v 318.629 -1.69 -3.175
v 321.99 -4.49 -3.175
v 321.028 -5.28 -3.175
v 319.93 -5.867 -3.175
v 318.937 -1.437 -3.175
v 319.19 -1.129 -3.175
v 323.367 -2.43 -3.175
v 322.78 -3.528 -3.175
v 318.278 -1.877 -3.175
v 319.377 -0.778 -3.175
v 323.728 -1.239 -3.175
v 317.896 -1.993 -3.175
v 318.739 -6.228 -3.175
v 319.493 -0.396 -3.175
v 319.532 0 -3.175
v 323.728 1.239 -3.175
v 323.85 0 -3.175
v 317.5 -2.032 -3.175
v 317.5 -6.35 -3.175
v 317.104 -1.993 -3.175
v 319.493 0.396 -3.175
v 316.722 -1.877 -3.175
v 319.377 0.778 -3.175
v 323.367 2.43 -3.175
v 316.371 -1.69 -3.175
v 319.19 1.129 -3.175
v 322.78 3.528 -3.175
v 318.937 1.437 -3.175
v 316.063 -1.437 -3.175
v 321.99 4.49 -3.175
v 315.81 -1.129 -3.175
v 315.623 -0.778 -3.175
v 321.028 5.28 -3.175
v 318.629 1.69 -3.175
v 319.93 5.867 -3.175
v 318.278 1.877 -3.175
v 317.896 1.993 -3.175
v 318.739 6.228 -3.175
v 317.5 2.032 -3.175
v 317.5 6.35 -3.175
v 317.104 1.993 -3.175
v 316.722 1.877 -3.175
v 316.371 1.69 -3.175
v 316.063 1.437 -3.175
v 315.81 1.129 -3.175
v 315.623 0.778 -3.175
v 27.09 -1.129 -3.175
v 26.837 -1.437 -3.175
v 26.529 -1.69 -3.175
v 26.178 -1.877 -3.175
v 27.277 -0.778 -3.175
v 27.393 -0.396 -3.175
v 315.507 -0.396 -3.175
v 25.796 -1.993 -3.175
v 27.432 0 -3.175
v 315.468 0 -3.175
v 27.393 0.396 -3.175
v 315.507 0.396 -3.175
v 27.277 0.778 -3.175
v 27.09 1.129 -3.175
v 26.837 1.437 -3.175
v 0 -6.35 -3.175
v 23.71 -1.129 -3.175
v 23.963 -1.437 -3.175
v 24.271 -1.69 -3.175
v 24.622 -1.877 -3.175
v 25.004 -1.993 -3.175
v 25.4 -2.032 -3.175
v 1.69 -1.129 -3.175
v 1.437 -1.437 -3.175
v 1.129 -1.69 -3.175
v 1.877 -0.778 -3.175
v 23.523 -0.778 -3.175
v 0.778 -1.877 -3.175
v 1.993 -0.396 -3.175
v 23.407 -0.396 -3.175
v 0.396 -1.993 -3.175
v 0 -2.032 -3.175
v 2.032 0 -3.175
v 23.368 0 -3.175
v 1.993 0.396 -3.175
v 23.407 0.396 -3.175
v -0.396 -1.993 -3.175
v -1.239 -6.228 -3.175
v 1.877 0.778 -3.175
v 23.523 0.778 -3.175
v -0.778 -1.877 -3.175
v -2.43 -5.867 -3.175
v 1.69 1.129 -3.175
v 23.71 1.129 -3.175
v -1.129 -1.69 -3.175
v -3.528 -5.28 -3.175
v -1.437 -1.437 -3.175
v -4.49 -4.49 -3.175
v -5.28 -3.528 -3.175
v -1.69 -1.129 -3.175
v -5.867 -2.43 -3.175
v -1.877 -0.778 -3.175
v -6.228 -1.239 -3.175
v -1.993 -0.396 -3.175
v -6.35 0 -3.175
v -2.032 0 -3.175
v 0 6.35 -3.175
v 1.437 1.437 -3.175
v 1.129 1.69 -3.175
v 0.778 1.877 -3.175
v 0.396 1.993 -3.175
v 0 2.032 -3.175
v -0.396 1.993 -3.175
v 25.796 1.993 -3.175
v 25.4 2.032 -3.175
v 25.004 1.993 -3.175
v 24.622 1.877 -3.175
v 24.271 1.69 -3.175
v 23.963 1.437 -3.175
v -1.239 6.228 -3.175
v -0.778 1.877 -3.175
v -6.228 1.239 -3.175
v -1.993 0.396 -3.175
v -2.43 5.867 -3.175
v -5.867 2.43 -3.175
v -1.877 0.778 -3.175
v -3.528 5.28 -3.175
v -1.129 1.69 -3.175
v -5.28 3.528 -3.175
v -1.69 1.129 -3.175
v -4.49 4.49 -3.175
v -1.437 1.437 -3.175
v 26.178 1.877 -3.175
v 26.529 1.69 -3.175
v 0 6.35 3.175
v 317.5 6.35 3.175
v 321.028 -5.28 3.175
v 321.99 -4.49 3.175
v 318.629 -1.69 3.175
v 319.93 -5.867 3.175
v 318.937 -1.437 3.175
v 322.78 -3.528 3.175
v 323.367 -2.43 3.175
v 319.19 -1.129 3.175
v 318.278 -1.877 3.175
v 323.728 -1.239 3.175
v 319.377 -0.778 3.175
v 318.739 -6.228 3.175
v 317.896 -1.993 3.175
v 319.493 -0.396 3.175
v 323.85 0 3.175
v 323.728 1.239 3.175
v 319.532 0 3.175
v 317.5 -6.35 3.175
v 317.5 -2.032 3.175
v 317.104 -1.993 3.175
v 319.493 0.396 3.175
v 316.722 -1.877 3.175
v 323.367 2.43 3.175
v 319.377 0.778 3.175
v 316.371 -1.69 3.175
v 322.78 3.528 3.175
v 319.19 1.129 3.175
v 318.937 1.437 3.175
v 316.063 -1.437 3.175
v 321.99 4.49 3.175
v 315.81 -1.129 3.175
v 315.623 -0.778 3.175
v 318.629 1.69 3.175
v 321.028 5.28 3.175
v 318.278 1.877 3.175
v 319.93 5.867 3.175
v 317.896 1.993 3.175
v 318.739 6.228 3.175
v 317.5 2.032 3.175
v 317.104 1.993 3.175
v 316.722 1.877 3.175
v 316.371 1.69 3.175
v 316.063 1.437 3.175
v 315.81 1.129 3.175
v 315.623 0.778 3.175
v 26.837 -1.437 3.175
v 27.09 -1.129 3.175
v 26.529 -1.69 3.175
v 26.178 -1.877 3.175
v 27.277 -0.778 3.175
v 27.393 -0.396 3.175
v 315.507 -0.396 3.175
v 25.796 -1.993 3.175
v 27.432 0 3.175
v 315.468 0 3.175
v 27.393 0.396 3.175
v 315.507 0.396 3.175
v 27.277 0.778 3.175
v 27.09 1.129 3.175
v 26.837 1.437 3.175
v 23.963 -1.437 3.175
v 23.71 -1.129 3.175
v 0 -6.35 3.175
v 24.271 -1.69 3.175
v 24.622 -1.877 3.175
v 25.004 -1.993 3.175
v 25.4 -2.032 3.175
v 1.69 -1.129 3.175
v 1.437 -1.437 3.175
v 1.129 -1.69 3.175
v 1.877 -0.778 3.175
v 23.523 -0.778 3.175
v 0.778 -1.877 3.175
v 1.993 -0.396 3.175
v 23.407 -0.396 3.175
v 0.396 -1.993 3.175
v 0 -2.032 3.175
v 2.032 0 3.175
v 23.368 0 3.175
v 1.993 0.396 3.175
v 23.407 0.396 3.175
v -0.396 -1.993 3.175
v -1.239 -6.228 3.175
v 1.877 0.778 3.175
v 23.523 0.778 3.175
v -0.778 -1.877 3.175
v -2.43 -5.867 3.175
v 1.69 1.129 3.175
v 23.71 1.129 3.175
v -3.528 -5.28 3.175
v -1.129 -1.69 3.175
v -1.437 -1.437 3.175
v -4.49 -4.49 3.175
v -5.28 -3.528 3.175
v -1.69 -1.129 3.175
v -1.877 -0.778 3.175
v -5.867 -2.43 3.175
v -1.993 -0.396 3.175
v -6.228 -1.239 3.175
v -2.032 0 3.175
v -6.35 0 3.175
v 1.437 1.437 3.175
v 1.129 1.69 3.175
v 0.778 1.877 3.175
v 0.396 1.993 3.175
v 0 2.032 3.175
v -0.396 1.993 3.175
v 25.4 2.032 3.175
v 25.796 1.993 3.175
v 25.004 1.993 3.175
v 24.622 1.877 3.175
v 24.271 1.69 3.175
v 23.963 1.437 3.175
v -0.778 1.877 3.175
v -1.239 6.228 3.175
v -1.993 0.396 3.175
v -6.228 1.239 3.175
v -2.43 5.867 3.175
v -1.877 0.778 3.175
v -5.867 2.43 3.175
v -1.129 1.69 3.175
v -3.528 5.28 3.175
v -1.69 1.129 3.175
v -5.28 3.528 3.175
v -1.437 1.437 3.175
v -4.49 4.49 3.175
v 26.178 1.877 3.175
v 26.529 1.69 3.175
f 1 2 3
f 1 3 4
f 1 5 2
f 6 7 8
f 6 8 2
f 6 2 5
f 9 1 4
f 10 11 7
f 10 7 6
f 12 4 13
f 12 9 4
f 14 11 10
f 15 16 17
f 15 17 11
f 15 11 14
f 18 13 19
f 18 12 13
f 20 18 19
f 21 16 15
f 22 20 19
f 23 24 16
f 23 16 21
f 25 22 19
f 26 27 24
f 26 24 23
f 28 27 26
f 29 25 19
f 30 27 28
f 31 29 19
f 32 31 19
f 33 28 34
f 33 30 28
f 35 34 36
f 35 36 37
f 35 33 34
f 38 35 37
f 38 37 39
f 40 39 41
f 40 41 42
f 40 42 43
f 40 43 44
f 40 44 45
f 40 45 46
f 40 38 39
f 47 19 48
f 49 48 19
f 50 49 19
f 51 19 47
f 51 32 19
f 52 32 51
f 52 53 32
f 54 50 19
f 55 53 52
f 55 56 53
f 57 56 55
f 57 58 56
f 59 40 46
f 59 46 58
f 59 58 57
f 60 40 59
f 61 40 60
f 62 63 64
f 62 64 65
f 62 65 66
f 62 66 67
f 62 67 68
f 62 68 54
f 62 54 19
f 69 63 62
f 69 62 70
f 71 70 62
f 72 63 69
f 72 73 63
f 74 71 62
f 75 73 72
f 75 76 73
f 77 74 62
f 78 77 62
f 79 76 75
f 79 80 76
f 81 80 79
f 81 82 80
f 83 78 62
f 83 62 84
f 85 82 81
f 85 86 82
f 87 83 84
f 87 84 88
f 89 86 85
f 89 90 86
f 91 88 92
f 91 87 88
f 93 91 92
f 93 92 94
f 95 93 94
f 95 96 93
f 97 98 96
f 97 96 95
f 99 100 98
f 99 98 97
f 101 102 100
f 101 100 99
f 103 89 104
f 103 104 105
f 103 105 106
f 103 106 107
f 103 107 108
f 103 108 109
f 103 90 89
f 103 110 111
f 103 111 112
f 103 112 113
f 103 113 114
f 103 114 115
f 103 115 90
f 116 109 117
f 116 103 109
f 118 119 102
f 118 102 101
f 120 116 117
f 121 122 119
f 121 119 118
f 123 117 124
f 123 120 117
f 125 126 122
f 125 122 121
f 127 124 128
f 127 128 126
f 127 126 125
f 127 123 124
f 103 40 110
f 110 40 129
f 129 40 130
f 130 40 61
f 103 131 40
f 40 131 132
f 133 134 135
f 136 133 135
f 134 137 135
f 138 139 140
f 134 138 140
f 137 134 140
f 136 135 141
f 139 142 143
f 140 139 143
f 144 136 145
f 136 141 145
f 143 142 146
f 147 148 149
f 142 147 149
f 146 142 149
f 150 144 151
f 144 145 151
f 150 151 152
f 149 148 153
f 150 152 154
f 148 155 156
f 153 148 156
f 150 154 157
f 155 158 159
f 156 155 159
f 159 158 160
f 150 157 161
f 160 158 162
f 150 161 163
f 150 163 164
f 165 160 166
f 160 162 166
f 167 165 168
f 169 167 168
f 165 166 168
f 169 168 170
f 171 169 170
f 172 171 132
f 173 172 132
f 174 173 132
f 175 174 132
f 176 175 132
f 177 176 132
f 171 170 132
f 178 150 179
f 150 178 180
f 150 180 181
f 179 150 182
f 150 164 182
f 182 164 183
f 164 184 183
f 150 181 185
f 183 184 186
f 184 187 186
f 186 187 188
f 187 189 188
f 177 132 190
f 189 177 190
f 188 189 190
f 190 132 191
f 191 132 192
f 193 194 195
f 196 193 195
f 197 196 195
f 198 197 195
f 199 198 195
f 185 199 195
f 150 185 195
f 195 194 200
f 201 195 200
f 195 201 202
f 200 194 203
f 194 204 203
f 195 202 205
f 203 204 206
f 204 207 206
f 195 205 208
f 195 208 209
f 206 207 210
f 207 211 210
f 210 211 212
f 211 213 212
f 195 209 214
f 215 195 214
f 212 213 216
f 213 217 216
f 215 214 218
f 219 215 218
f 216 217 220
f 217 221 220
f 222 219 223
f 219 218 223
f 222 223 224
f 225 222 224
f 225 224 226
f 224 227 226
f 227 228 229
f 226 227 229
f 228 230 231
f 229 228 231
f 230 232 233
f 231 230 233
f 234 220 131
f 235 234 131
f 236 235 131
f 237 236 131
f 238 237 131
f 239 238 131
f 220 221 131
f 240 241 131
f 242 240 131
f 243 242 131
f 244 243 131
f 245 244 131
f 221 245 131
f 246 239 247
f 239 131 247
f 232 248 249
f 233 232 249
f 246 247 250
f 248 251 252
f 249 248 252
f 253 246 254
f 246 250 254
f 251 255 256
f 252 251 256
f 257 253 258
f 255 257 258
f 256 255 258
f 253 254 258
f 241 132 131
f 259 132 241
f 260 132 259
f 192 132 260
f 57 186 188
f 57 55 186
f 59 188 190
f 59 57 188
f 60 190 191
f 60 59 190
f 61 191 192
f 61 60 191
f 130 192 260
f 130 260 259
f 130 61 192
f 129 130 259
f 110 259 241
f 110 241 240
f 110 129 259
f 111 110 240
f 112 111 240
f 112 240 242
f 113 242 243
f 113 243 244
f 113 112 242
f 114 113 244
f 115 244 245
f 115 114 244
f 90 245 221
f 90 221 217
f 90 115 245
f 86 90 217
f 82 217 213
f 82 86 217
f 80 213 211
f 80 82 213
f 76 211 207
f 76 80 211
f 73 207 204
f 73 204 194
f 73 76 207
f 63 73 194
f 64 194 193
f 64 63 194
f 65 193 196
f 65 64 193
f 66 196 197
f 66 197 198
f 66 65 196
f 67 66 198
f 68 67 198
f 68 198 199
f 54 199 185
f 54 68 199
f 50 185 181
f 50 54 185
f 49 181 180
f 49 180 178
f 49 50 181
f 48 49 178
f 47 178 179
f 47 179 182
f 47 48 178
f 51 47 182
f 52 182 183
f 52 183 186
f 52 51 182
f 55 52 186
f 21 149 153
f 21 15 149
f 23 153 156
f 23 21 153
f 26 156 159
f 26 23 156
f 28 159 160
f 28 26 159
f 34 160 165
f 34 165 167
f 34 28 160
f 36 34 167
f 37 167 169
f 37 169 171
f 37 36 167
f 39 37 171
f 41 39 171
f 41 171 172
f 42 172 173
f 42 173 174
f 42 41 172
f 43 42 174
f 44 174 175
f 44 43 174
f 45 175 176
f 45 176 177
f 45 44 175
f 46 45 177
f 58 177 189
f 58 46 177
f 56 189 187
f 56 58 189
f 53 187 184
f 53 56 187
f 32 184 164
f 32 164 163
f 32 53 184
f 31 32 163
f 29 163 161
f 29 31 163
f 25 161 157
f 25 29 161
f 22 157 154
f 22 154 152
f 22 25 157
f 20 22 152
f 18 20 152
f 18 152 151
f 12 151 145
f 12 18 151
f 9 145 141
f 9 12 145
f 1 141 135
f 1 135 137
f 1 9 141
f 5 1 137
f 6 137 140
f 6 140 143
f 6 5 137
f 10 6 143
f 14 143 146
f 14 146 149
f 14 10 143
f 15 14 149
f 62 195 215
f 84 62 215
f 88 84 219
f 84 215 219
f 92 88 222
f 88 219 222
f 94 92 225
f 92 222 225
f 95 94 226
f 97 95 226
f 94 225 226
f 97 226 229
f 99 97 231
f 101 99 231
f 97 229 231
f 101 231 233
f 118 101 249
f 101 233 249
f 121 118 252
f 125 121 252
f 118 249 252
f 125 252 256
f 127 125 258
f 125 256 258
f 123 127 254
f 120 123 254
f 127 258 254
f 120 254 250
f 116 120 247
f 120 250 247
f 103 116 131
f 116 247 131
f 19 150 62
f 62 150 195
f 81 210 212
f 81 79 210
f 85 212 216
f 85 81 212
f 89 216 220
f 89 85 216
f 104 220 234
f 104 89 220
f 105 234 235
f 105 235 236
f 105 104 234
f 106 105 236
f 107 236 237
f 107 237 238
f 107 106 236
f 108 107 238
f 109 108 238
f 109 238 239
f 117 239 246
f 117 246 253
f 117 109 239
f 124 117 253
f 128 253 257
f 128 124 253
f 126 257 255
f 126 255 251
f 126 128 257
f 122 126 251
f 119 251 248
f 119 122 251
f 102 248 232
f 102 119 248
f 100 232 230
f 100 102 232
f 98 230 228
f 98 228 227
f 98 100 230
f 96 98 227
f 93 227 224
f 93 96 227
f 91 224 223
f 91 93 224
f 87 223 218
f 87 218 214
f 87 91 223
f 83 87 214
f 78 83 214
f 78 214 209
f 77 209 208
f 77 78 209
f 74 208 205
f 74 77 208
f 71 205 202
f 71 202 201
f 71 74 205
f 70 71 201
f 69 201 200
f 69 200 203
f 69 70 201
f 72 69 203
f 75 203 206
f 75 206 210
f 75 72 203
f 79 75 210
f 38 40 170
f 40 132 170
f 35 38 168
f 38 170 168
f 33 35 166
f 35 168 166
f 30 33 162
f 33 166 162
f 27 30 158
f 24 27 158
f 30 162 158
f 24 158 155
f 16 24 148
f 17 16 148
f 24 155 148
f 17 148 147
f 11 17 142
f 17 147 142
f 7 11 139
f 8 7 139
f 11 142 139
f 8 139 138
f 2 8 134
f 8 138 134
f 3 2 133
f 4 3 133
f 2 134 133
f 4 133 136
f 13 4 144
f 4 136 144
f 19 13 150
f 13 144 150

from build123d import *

# Parameters (mm, degrees)
SKETCH1_R           = 2.032
BOSS_EXTRUDE1_DEPTH = 3.175


with BuildPart() as part:
    # Sketch1 → Boss-Extrude1 (new, symmetric)
    with BuildSketch(Plane.XY):
        with BuildLine():
            Line((0, 6.35), (317.5, 6.35))
            ThreePointArc((317.5, 6.35), (323.85, 0), (317.5, -6.35))
            Line((317.5, -6.35), (0, -6.35))
            ThreePointArc((0, -6.35), (-6.35, 0), (0, 6.35))
        make_face()
        Circle(SKETCH1_R, mode=Mode.SUBTRACT)
        with Locations((317.5, 0)):
            Circle(SKETCH1_R, mode=Mode.SUBTRACT)
        with Locations((25.4, 0)):
            Circle(SKETCH1_R, mode=Mode.SUBTRACT)
    extrude(amount=BOSS_EXTRUDE1_DEPTH, both=True)


solid = part.part
